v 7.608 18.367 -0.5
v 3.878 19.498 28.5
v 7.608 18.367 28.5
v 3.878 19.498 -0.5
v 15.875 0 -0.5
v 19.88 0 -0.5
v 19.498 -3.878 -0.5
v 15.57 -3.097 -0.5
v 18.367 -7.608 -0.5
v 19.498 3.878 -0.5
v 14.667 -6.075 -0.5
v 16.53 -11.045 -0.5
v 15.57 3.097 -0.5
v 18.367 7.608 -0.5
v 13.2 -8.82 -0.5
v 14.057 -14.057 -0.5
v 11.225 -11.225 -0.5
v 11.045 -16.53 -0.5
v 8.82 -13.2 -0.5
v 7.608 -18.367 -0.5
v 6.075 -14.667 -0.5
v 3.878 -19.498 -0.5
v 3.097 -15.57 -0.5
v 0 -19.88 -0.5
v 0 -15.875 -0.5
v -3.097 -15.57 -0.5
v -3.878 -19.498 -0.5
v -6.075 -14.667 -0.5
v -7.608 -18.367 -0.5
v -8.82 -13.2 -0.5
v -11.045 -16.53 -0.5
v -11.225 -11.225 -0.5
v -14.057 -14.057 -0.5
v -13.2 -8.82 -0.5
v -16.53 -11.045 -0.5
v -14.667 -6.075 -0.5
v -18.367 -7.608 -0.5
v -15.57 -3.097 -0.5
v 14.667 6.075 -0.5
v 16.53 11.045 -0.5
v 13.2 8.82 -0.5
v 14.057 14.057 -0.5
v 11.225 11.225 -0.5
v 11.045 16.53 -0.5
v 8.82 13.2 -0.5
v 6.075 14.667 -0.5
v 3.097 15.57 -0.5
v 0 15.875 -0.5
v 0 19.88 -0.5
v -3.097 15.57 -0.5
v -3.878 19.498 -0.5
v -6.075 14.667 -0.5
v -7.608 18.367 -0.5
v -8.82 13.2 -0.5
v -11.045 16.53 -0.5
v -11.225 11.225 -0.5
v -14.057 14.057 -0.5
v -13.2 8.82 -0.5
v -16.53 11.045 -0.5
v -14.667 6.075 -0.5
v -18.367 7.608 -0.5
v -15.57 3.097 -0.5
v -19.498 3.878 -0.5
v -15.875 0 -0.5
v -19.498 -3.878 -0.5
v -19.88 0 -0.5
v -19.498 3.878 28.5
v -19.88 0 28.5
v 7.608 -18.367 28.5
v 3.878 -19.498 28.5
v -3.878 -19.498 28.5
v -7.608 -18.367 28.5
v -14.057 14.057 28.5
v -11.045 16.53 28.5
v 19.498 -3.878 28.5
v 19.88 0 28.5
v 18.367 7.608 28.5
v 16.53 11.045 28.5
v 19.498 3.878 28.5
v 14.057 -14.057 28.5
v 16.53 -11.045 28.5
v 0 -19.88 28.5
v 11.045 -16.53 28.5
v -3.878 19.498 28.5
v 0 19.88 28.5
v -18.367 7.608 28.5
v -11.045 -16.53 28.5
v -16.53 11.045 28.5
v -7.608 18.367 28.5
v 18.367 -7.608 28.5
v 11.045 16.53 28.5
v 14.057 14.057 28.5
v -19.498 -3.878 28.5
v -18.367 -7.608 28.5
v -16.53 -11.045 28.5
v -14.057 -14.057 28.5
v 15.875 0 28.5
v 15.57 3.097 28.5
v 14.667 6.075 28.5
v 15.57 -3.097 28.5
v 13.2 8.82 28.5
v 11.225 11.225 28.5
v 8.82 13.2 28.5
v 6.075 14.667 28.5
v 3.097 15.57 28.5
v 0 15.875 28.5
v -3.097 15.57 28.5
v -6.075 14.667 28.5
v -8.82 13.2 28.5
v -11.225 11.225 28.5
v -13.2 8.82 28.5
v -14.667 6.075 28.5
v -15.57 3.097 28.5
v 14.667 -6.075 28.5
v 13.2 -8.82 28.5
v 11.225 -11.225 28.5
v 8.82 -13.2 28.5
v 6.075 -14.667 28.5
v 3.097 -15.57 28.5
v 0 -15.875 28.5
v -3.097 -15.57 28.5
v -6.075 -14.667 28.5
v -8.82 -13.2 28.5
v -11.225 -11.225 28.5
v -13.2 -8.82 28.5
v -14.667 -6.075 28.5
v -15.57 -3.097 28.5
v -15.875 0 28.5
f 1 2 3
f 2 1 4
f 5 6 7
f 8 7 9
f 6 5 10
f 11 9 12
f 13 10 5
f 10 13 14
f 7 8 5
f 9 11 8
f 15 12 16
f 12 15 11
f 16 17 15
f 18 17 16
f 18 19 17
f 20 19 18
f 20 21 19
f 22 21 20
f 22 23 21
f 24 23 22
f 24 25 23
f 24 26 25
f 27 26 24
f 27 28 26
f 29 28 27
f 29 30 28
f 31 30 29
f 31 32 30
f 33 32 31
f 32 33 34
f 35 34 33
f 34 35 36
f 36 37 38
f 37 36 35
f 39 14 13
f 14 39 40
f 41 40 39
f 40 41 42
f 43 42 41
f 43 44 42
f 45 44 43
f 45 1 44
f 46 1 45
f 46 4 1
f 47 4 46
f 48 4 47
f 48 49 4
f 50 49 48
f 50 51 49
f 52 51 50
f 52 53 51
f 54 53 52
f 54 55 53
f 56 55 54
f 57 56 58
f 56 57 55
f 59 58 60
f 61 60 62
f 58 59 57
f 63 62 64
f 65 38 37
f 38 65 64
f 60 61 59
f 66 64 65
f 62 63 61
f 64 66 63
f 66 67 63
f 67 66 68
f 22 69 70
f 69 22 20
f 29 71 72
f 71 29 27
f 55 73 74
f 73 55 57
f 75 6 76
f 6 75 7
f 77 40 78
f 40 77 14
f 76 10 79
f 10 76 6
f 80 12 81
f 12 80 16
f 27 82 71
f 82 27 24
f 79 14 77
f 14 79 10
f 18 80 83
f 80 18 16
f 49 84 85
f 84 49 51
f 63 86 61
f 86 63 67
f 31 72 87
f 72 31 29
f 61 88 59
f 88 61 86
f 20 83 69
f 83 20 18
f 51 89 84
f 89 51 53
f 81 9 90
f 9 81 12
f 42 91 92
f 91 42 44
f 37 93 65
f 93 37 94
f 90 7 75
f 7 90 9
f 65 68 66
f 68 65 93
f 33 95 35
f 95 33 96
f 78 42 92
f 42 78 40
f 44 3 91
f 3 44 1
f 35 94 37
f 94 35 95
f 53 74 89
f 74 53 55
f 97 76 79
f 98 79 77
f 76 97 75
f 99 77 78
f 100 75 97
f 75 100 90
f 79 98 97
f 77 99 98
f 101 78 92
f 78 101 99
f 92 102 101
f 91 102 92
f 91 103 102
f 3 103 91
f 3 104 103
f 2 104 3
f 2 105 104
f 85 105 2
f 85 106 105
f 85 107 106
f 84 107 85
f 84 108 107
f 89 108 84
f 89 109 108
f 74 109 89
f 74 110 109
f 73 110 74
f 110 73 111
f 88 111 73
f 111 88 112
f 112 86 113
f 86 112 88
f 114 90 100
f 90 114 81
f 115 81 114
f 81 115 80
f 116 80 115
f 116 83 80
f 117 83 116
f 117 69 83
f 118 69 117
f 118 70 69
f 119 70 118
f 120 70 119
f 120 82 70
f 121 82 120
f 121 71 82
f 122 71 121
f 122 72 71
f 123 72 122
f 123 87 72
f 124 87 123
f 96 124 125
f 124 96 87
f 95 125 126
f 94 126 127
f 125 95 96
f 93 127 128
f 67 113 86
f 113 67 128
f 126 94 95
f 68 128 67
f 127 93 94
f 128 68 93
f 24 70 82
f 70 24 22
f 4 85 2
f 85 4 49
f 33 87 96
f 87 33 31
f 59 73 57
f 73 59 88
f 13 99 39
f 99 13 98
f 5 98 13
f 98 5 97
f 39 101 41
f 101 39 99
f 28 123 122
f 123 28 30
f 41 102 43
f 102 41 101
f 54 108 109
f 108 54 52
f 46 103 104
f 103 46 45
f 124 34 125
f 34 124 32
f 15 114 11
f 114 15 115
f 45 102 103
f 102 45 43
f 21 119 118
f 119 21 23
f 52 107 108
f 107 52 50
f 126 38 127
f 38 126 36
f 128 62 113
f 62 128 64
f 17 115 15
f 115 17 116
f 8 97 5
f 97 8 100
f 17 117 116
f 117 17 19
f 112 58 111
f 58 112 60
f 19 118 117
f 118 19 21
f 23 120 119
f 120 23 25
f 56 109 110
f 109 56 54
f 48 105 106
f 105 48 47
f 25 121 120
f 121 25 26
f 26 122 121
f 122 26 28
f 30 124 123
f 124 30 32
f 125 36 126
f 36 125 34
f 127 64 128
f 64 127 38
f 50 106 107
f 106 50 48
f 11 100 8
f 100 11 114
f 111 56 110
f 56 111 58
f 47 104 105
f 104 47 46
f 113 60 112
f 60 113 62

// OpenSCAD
$fn = 32;

// ----------------------------------------------------------------------
// Two-module gear rim: z16 m2 and z16 m2, 28 mm wide
// ----------------------------------------------------------------------

// --- parameters (mm) ---
module_a = 2;             // first tooth module
teeth_a = 16;             // first band tooth count
module_b = 2;             // second tooth module
teeth_b = 16;             // second band tooth count
band_h = 12;              // height of one tooth band
web_t = 4;                // web thickness between the bands
total = 28;               // overall width over both bands
root_r = 13.5;            // root radius of the coarse band
hub_r = 19.88;            // hub radius
bore_d = 31.75;           // hub bore
hole_count = 4;           // lightening holes
hole_r = 9.75;            // lightening hole circle radius
hole_d = 4;               // lightening hole diameter

band_a = [[13.414, -1.521], [15.981, -1.553], [16.987, -1.192], [17.988, -0.666], [17.988, 0.666], [16.987, 1.192], [15.981, 1.553], [13.414, 1.521], [12.975, 3.728], [15.359, 4.681], [16.15, 5.399], [16.873, 6.269], [16.364, 7.498], [15.237, 7.602], [14.171, 7.551], [11.811, 6.538], [10.561, 8.41], [12.399, 10.202], [12.854, 11.168], [13.19, 12.249], [12.249, 13.19], [11.168, 12.854], [10.202, 12.399], [8.41, 10.561], [6.538, 11.811], [7.551, 14.171], [7.602, 15.237], [7.498, 16.364], [6.269, 16.873], [5.399, 16.15], [4.681, 15.359], [3.728, 12.975], [1.521, 13.414], [1.553, 15.981], [1.192, 16.987], [0.666, 17.988], [-0.666, 17.988], [-1.192, 16.987], [-1.553, 15.981], [-1.521, 13.414], [-3.728, 12.975], [-4.681, 15.359], [-5.399, 16.15], [-6.269, 16.873], [-7.498, 16.364], [-7.602, 15.237], [-7.551, 14.171], [-6.538, 11.811], [-8.41, 10.561], [-10.202, 12.399], [-11.168, 12.854], [-12.249, 13.19], [-13.19, 12.249], [-12.854, 11.168], [-12.399, 10.202], [-10.561, 8.41], [-11.811, 6.538], [-14.171, 7.551], [-15.237, 7.602], [-16.364, 7.498], [-16.873, 6.269], [-16.15, 5.399], [-15.359, 4.681], [-12.975, 3.728], [-13.414, 1.521], [-15.981, 1.553], [-16.987, 1.192], [-17.988, 0.666], [-17.988, -0.666], [-16.987, -1.192], [-15.981, -1.553], [-13.414, -1.521], [-12.975, -3.728], [-15.359, -4.681], [-16.15, -5.399], [-16.873, -6.269], [-16.364, -7.498], [-15.237, -7.602], [-14.171, -7.551], [-11.811, -6.538], [-10.561, -8.41], [-12.399, -10.202], [-12.854, -11.168], [-13.19, -12.249], [-12.249, -13.19], [-11.168, -12.854], [-10.202, -12.399], [-8.41, -10.561], [-6.538, -11.811], [-7.551, -14.171], [-7.602, -15.237], [-7.498, -16.364], [-6.269, -16.873], [-5.399, -16.15], [-4.681, -15.359], [-3.728, -12.975], [-1.521, -13.414], [-1.553, -15.981], [-1.192, -16.987], [-0.666, -17.988], [0.666, -17.988], [1.192, -16.987], [1.553, -15.981], [1.521, -13.414], [3.728, -12.975], [4.681, -15.359], [5.399, -16.15], [6.269, -16.873], [7.498, -16.364], [7.602, -15.237], [7.551, -14.171], [6.538, -11.811], [8.41, -10.561], [10.202, -12.399], [11.168, -12.854], [12.249, -13.19], [13.19, -12.249], [12.854, -11.168], [12.399, -10.202], [10.561, -8.41], [11.811, -6.538], [14.171, -7.551], [15.237, -7.602], [16.364, -7.498], [16.873, -6.269], [16.15, -5.399], [15.359, -4.681], [12.975, -3.728]];
band_b = [[13.414, -1.521], [15.981, -1.553], [16.987, -1.192], [17.988, -0.666], [17.988, 0.666], [16.987, 1.192], [15.981, 1.553], [13.414, 1.521], [12.975, 3.728], [15.359, 4.681], [16.15, 5.399], [16.873, 6.269], [16.364, 7.498], [15.237, 7.602], [14.171, 7.551], [11.811, 6.538], [10.561, 8.41], [12.399, 10.202], [12.854, 11.168], [13.19, 12.249], [12.249, 13.19], [11.168, 12.854], [10.202, 12.399], [8.41, 10.561], [6.538, 11.811], [7.551, 14.171], [7.602, 15.237], [7.498, 16.364], [6.269, 16.873], [5.399, 16.15], [4.681, 15.359], [3.728, 12.975], [1.521, 13.414], [1.553, 15.981], [1.192, 16.987], [0.666, 17.988], [-0.666, 17.988], [-1.192, 16.987], [-1.553, 15.981], [-1.521, 13.414], [-3.728, 12.975], [-4.681, 15.359], [-5.399, 16.15], [-6.269, 16.873], [-7.498, 16.364], [-7.602, 15.237], [-7.551, 14.171], [-6.538, 11.811], [-8.41, 10.561], [-10.202, 12.399], [-11.168, 12.854], [-12.249, 13.19], [-13.19, 12.249], [-12.854, 11.168], [-12.399, 10.202], [-10.561, 8.41], [-11.811, 6.538], [-14.171, 7.551], [-15.237, 7.602], [-16.364, 7.498], [-16.873, 6.269], [-16.15, 5.399], [-15.359, 4.681], [-12.975, 3.728], [-13.414, 1.521], [-15.981, 1.553], [-16.987, 1.192], [-17.988, 0.666], [-17.988, -0.666], [-16.987, -1.192], [-15.981, -1.553], [-13.414, -1.521], [-12.975, -3.728], [-15.359, -4.681], [-16.15, -5.399], [-16.873, -6.269], [-16.364, -7.498], [-15.237, -7.602], [-14.171, -7.551], [-11.811, -6.538], [-10.561, -8.41], [-12.399, -10.202], [-12.854, -11.168], [-13.19, -12.249], [-12.249, -13.19], [-11.168, -12.854], [-10.202, -12.399], [-8.41, -10.561], [-6.538, -11.811], [-7.551, -14.171], [-7.602, -15.237], [-7.498, -16.364], [-6.269, -16.873], [-5.399, -16.15], [-4.681, -15.359], [-3.728, -12.975], [-1.521, -13.414], [-1.553, -15.981], [-1.192, -16.987], [-0.666, -17.988], [0.666, -17.988], [1.192, -16.987], [1.553, -15.981], [1.521, -13.414], [3.728, -12.975], [4.681, -15.359], [5.399, -16.15], [6.269, -16.873], [7.498, -16.364], [7.602, -15.237], [7.551, -14.171], [6.538, -11.811], [8.41, -10.561], [10.202, -12.399], [11.168, -12.854], [12.249, -13.19], [13.19, -12.249], [12.854, -11.168], [12.399, -10.202], [10.561, -8.41], [11.811, -6.538], [14.171, -7.551], [15.237, -7.602], [16.364, -7.498], [16.873, -6.269], [16.15, -5.399], [15.359, -4.681], [12.975, -3.728]];

difference() {
  union() {
    /* tooth band A, overlapping the web by 0.4 mm */
    linear_extrude(height = band_h + 0.4) polygon(band_a);
    /* web */
    translate([0, 0, band_h - 0.4]) cylinder(h = web_t + 0.8, d = 2 * root_r);
    /* tooth band B */
    translate([0, 0, band_h + web_t]) linear_extrude(height = band_h + 0.4) polygon(band_b);
    /* hub */
    translate([0, 0, -0.5]) cylinder(h = total + 1.0, d = 2 * hub_r);
  }
  /* bore */
  translate([0, 0, -2.5]) cylinder(h = total + 5, d = bore_d);
  /* lightening holes through the web */
  for (i = [0 : hole_count - 1]) {
    a = i * 360 / hole_count;
    translate([hole_r * cos(a), hole_r * sin(a), -2.5]) cylinder(h = total + 5, d = hole_d);
  }
}
